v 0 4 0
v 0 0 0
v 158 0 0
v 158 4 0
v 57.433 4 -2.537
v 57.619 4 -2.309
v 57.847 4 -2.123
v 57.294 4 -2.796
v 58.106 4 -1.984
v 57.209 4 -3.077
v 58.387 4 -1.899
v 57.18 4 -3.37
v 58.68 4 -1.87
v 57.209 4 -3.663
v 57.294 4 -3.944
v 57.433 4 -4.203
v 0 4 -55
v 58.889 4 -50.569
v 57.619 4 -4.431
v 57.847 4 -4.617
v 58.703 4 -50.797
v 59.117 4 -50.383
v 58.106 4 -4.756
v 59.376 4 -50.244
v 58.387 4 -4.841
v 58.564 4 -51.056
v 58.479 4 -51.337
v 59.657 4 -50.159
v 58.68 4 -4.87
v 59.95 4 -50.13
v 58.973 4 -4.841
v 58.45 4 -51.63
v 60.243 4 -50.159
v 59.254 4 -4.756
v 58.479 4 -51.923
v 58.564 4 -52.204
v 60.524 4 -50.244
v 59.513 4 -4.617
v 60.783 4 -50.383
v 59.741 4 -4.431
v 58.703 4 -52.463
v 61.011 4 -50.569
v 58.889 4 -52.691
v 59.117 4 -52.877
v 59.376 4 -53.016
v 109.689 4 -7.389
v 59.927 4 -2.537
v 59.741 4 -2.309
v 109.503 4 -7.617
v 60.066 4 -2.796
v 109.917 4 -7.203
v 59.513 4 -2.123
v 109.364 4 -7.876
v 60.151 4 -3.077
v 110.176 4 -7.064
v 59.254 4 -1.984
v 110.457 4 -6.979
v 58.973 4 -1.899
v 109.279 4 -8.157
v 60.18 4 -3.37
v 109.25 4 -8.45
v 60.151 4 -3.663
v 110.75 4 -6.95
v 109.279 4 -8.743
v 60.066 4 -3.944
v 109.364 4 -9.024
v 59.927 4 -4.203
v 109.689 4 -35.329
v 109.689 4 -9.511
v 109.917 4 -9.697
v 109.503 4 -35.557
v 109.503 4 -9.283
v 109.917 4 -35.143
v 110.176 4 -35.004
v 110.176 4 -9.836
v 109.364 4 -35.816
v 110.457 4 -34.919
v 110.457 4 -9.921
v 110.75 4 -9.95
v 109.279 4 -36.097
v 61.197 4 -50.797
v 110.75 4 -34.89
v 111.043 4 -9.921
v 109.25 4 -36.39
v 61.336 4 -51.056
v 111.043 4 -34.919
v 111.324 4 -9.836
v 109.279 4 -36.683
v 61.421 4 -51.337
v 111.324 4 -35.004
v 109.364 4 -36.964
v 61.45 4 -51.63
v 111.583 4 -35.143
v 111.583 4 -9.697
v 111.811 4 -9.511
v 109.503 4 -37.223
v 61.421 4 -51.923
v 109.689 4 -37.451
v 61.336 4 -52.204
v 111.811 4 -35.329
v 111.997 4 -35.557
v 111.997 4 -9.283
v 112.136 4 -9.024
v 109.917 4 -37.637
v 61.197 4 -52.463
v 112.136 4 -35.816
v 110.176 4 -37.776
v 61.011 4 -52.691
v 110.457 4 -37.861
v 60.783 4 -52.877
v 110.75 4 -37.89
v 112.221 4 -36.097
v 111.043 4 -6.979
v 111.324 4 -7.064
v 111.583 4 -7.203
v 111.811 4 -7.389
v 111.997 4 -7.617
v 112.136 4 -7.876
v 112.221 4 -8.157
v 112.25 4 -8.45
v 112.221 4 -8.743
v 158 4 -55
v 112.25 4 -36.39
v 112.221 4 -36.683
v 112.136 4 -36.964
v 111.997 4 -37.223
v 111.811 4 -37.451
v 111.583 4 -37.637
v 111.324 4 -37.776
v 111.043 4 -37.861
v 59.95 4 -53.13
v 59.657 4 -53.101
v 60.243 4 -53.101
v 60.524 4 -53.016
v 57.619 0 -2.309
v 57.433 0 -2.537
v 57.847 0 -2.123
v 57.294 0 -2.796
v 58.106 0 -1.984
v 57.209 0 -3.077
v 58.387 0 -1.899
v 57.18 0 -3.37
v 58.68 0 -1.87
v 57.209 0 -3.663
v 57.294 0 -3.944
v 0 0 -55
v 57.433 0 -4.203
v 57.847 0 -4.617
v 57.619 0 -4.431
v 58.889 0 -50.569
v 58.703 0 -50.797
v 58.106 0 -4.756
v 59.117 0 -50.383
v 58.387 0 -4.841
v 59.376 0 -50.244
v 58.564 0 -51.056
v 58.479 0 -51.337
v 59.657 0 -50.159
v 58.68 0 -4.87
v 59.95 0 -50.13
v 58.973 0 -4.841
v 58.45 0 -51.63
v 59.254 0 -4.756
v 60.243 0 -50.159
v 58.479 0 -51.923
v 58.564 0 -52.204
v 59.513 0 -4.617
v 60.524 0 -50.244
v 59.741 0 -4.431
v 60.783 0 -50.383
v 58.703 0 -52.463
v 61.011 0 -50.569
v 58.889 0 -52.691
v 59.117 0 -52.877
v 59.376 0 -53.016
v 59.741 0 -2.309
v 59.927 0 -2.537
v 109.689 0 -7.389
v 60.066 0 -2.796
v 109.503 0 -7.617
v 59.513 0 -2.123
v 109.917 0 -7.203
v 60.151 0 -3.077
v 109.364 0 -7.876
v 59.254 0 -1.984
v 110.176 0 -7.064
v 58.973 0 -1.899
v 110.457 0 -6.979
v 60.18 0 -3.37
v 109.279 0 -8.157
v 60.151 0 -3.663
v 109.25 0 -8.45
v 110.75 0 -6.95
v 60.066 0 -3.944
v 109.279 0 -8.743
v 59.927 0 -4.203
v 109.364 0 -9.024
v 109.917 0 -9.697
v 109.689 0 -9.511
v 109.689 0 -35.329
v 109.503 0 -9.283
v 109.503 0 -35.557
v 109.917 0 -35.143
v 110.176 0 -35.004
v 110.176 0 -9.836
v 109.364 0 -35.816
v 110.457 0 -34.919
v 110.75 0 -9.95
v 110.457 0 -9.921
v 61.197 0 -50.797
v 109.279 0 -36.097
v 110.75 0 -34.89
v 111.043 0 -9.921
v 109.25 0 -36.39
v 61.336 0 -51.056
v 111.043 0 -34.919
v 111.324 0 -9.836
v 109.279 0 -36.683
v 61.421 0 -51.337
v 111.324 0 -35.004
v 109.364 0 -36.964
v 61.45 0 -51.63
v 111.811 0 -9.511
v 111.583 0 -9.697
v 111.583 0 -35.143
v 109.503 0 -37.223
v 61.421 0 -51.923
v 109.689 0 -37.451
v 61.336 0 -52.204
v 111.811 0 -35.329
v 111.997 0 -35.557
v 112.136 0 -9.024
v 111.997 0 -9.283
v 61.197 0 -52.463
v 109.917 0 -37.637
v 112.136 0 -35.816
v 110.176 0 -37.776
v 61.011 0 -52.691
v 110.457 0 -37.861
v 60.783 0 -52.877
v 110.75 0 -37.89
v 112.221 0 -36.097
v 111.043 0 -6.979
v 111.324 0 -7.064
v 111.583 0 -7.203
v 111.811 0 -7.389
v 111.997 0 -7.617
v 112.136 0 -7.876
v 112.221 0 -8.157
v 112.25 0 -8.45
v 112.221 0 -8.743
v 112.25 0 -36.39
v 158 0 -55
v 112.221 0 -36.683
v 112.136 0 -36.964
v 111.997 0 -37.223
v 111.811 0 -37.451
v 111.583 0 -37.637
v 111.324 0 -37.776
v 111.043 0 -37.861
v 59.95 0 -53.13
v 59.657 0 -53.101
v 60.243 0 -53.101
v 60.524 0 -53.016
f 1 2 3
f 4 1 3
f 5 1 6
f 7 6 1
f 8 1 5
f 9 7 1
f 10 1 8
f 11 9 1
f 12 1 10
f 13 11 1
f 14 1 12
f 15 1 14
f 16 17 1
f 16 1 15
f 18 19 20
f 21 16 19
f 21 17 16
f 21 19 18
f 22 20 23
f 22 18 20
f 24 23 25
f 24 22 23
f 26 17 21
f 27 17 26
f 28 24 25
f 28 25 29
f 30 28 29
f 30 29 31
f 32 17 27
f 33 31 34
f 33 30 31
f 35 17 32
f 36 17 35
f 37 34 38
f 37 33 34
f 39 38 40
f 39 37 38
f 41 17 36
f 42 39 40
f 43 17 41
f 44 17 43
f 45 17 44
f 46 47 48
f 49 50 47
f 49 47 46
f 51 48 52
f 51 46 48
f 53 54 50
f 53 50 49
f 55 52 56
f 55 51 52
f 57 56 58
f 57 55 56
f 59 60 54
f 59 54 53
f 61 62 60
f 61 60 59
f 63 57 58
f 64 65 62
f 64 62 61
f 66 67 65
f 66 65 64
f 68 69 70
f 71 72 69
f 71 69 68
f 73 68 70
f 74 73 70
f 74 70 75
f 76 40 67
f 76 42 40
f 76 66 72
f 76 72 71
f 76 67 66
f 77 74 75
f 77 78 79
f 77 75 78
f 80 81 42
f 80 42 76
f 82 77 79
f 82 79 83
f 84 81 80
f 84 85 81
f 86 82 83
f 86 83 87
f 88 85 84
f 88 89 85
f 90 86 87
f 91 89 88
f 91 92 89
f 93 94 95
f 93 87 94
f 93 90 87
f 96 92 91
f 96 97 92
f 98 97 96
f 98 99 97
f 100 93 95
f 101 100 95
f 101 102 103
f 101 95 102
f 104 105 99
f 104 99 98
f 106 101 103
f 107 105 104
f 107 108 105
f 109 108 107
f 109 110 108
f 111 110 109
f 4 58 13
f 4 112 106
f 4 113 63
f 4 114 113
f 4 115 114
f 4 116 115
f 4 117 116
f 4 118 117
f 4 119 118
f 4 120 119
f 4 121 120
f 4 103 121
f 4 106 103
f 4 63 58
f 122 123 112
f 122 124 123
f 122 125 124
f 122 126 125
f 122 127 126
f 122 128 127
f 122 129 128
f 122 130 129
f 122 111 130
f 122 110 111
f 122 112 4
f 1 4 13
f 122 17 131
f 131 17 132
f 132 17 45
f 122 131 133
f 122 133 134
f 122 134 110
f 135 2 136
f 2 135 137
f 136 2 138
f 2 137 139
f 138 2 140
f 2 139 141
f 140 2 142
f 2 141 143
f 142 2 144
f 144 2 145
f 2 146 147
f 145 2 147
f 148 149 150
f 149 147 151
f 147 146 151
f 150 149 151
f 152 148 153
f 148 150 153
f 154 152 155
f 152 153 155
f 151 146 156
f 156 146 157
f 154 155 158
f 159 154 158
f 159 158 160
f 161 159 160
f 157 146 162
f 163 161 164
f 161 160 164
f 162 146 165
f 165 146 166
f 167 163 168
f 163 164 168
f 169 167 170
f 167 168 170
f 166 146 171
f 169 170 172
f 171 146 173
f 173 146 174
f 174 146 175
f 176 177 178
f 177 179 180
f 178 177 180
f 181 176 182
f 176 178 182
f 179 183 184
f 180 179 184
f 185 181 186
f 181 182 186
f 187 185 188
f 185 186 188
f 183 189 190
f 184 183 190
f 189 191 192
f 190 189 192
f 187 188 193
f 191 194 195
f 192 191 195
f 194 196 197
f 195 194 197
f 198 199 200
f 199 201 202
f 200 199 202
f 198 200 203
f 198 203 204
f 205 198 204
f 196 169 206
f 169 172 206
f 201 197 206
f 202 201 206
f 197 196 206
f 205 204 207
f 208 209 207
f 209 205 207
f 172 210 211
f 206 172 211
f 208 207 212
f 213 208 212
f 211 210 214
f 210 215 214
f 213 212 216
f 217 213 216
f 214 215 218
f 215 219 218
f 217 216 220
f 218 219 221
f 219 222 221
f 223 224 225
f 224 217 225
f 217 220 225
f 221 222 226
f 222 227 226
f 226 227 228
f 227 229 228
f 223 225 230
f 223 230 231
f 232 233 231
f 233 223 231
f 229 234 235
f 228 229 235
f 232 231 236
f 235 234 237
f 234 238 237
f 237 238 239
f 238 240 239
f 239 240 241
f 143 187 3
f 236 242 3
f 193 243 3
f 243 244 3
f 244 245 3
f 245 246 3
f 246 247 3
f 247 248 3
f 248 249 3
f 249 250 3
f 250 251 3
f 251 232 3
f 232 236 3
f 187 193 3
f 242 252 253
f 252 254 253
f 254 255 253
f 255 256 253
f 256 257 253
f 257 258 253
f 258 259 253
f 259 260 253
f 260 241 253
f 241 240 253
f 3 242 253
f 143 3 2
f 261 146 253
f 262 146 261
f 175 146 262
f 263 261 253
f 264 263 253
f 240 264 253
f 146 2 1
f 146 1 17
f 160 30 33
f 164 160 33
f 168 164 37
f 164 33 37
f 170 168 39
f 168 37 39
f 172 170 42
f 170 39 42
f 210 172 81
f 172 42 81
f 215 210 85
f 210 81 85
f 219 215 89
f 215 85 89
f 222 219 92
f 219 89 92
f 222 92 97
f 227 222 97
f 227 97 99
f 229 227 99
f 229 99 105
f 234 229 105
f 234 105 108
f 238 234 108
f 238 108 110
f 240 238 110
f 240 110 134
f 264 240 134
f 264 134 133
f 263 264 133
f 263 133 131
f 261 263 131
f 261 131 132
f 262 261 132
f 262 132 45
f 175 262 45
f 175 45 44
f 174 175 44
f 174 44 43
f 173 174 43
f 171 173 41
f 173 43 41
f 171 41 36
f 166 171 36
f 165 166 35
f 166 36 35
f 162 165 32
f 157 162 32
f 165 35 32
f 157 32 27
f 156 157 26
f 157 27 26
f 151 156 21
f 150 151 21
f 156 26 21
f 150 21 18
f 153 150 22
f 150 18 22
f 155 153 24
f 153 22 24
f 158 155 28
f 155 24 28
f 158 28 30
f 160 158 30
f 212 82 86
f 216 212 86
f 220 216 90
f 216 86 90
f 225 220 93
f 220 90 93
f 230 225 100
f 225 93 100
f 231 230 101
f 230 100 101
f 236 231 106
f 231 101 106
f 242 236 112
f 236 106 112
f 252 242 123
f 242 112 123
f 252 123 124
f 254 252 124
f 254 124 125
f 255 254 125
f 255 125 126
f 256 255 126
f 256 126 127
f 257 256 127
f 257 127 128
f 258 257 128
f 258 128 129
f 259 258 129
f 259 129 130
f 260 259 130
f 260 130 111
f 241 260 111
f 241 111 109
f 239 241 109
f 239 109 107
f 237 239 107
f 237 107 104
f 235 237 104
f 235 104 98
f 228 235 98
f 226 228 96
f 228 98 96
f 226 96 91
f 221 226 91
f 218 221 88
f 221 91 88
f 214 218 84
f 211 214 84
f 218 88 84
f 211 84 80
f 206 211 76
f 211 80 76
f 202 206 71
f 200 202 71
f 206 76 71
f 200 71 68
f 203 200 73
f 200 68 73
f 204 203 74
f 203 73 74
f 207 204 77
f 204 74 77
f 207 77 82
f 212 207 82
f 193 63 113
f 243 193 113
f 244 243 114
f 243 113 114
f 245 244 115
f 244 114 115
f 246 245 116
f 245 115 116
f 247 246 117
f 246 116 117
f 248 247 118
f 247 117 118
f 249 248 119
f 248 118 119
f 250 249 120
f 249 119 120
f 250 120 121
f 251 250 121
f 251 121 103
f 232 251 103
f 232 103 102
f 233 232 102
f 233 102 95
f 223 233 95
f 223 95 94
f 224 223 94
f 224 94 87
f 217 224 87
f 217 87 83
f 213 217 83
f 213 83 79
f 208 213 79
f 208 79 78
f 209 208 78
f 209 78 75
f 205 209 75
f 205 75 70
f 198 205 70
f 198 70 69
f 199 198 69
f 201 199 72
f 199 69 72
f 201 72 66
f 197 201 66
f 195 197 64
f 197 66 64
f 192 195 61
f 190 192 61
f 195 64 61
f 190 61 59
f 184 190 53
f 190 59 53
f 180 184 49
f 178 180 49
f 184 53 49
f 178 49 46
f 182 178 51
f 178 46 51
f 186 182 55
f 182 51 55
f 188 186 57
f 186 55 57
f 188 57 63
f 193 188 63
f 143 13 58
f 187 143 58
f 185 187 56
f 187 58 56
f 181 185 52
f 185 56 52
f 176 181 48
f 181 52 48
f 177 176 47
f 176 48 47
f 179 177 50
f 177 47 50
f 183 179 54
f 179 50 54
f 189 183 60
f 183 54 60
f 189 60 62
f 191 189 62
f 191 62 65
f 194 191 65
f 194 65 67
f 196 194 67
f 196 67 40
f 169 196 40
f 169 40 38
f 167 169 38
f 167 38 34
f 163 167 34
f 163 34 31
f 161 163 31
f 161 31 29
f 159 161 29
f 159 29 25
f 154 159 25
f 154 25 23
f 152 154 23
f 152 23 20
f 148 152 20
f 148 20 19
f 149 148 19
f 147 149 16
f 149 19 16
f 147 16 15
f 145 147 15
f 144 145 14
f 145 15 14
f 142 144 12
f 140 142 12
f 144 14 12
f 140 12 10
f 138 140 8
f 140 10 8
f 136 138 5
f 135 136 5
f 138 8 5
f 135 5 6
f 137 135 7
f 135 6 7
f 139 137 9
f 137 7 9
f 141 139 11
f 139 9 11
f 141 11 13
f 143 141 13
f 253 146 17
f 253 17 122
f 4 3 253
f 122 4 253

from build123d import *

# Parameters (mm, degrees)
SKETCH1_W           = 158
SKETCH1_H           = 55
BOSS_EXTRUDE1_DEPTH = 4
CUT_EXTRUDE2_REACH  = 169.347
SKETCH2_R           = 1.5


with BuildPart() as part:
    # Sketch1 → Boss-Extrude1 (new body)
    with BuildSketch(Plane(origin=(0, 0, 0), x_dir=(1, 0, 0), z_dir=(0, 1, 0))):
        with Locations((79, 27.5)):
            Rectangle(SKETCH1_W, SKETCH1_H)
    extrude(amount=BOSS_EXTRUDE1_DEPTH)

    # Sketch2 → Cut-Extrude2 (cut, up to next)
    with BuildSketch(Plane(origin=(0, 4, 0), x_dir=(1, 0, 0), z_dir=(0, 1, 0)), mode=Mode.PRIVATE) as cut_extrude2_sk1:
        with Locations(Location((110.75, 36.39, 0), (0, 0, 270))):
            Circle(SKETCH2_R)
    cut_extrude2_tool1 = extrude(cut_extrude2_sk1.sketch, amount=-CUT_EXTRUDE2_REACH, mode=Mode.PRIVATE) & part.part
    # Sketch2 → Cut-Extrude2 (cut, up to next)
    with BuildSketch(Plane(origin=(0, 4, 0), x_dir=(1, 0, 0), z_dir=(0, 1, 0)), mode=Mode.PRIVATE) as cut_extrude2_sk2:
        with Locations(Location((59.95, 51.63, 0), (0, 0, 270))):
            Circle(SKETCH2_R)
    cut_extrude2_tool2 = extrude(cut_extrude2_sk2.sketch, amount=-CUT_EXTRUDE2_REACH, mode=Mode.PRIVATE) & part.part
    # Sketch2 → Cut-Extrude2 (cut, up to next)
    with BuildSketch(Plane(origin=(0, 4, 0), x_dir=(1, 0, 0), z_dir=(0, 1, 0)), mode=Mode.PRIVATE) as cut_extrude2_sk3:
        with Locations(Location((110.75, 8.45, 0), (0, 0, 270))):
            Circle(SKETCH2_R)
    cut_extrude2_tool3 = extrude(cut_extrude2_sk3.sketch, amount=-CUT_EXTRUDE2_REACH, mode=Mode.PRIVATE) & part.part
    # Sketch2 → Cut-Extrude2 (cut, up to next)
    with BuildSketch(Plane(origin=(0, 4, 0), x_dir=(1, 0, 0), z_dir=(0, 1, 0)), mode=Mode.PRIVATE) as cut_extrude2_sk4:
        with Locations(Location((58.68, 3.37, 0), (0, 0, 270))):
            Circle(SKETCH2_R)
    cut_extrude2_tool4 = extrude(cut_extrude2_sk4.sketch, amount=-CUT_EXTRUDE2_REACH, mode=Mode.PRIVATE) & part.part
    add(cut_extrude2_tool1.solids().sort_by_distance((110.75, 4, -36.39))[0], mode=Mode.SUBTRACT)
    add(cut_extrude2_tool2.solids().sort_by_distance((59.95, 4, -51.63))[0], mode=Mode.SUBTRACT)
    add(cut_extrude2_tool3.solids().sort_by_distance((110.75, 4, -8.45))[0], mode=Mode.SUBTRACT)
    add(cut_extrude2_tool4.solids().sort_by_distance((58.68, 4, -3.37))[0], mode=Mode.SUBTRACT)


solid = part.part
